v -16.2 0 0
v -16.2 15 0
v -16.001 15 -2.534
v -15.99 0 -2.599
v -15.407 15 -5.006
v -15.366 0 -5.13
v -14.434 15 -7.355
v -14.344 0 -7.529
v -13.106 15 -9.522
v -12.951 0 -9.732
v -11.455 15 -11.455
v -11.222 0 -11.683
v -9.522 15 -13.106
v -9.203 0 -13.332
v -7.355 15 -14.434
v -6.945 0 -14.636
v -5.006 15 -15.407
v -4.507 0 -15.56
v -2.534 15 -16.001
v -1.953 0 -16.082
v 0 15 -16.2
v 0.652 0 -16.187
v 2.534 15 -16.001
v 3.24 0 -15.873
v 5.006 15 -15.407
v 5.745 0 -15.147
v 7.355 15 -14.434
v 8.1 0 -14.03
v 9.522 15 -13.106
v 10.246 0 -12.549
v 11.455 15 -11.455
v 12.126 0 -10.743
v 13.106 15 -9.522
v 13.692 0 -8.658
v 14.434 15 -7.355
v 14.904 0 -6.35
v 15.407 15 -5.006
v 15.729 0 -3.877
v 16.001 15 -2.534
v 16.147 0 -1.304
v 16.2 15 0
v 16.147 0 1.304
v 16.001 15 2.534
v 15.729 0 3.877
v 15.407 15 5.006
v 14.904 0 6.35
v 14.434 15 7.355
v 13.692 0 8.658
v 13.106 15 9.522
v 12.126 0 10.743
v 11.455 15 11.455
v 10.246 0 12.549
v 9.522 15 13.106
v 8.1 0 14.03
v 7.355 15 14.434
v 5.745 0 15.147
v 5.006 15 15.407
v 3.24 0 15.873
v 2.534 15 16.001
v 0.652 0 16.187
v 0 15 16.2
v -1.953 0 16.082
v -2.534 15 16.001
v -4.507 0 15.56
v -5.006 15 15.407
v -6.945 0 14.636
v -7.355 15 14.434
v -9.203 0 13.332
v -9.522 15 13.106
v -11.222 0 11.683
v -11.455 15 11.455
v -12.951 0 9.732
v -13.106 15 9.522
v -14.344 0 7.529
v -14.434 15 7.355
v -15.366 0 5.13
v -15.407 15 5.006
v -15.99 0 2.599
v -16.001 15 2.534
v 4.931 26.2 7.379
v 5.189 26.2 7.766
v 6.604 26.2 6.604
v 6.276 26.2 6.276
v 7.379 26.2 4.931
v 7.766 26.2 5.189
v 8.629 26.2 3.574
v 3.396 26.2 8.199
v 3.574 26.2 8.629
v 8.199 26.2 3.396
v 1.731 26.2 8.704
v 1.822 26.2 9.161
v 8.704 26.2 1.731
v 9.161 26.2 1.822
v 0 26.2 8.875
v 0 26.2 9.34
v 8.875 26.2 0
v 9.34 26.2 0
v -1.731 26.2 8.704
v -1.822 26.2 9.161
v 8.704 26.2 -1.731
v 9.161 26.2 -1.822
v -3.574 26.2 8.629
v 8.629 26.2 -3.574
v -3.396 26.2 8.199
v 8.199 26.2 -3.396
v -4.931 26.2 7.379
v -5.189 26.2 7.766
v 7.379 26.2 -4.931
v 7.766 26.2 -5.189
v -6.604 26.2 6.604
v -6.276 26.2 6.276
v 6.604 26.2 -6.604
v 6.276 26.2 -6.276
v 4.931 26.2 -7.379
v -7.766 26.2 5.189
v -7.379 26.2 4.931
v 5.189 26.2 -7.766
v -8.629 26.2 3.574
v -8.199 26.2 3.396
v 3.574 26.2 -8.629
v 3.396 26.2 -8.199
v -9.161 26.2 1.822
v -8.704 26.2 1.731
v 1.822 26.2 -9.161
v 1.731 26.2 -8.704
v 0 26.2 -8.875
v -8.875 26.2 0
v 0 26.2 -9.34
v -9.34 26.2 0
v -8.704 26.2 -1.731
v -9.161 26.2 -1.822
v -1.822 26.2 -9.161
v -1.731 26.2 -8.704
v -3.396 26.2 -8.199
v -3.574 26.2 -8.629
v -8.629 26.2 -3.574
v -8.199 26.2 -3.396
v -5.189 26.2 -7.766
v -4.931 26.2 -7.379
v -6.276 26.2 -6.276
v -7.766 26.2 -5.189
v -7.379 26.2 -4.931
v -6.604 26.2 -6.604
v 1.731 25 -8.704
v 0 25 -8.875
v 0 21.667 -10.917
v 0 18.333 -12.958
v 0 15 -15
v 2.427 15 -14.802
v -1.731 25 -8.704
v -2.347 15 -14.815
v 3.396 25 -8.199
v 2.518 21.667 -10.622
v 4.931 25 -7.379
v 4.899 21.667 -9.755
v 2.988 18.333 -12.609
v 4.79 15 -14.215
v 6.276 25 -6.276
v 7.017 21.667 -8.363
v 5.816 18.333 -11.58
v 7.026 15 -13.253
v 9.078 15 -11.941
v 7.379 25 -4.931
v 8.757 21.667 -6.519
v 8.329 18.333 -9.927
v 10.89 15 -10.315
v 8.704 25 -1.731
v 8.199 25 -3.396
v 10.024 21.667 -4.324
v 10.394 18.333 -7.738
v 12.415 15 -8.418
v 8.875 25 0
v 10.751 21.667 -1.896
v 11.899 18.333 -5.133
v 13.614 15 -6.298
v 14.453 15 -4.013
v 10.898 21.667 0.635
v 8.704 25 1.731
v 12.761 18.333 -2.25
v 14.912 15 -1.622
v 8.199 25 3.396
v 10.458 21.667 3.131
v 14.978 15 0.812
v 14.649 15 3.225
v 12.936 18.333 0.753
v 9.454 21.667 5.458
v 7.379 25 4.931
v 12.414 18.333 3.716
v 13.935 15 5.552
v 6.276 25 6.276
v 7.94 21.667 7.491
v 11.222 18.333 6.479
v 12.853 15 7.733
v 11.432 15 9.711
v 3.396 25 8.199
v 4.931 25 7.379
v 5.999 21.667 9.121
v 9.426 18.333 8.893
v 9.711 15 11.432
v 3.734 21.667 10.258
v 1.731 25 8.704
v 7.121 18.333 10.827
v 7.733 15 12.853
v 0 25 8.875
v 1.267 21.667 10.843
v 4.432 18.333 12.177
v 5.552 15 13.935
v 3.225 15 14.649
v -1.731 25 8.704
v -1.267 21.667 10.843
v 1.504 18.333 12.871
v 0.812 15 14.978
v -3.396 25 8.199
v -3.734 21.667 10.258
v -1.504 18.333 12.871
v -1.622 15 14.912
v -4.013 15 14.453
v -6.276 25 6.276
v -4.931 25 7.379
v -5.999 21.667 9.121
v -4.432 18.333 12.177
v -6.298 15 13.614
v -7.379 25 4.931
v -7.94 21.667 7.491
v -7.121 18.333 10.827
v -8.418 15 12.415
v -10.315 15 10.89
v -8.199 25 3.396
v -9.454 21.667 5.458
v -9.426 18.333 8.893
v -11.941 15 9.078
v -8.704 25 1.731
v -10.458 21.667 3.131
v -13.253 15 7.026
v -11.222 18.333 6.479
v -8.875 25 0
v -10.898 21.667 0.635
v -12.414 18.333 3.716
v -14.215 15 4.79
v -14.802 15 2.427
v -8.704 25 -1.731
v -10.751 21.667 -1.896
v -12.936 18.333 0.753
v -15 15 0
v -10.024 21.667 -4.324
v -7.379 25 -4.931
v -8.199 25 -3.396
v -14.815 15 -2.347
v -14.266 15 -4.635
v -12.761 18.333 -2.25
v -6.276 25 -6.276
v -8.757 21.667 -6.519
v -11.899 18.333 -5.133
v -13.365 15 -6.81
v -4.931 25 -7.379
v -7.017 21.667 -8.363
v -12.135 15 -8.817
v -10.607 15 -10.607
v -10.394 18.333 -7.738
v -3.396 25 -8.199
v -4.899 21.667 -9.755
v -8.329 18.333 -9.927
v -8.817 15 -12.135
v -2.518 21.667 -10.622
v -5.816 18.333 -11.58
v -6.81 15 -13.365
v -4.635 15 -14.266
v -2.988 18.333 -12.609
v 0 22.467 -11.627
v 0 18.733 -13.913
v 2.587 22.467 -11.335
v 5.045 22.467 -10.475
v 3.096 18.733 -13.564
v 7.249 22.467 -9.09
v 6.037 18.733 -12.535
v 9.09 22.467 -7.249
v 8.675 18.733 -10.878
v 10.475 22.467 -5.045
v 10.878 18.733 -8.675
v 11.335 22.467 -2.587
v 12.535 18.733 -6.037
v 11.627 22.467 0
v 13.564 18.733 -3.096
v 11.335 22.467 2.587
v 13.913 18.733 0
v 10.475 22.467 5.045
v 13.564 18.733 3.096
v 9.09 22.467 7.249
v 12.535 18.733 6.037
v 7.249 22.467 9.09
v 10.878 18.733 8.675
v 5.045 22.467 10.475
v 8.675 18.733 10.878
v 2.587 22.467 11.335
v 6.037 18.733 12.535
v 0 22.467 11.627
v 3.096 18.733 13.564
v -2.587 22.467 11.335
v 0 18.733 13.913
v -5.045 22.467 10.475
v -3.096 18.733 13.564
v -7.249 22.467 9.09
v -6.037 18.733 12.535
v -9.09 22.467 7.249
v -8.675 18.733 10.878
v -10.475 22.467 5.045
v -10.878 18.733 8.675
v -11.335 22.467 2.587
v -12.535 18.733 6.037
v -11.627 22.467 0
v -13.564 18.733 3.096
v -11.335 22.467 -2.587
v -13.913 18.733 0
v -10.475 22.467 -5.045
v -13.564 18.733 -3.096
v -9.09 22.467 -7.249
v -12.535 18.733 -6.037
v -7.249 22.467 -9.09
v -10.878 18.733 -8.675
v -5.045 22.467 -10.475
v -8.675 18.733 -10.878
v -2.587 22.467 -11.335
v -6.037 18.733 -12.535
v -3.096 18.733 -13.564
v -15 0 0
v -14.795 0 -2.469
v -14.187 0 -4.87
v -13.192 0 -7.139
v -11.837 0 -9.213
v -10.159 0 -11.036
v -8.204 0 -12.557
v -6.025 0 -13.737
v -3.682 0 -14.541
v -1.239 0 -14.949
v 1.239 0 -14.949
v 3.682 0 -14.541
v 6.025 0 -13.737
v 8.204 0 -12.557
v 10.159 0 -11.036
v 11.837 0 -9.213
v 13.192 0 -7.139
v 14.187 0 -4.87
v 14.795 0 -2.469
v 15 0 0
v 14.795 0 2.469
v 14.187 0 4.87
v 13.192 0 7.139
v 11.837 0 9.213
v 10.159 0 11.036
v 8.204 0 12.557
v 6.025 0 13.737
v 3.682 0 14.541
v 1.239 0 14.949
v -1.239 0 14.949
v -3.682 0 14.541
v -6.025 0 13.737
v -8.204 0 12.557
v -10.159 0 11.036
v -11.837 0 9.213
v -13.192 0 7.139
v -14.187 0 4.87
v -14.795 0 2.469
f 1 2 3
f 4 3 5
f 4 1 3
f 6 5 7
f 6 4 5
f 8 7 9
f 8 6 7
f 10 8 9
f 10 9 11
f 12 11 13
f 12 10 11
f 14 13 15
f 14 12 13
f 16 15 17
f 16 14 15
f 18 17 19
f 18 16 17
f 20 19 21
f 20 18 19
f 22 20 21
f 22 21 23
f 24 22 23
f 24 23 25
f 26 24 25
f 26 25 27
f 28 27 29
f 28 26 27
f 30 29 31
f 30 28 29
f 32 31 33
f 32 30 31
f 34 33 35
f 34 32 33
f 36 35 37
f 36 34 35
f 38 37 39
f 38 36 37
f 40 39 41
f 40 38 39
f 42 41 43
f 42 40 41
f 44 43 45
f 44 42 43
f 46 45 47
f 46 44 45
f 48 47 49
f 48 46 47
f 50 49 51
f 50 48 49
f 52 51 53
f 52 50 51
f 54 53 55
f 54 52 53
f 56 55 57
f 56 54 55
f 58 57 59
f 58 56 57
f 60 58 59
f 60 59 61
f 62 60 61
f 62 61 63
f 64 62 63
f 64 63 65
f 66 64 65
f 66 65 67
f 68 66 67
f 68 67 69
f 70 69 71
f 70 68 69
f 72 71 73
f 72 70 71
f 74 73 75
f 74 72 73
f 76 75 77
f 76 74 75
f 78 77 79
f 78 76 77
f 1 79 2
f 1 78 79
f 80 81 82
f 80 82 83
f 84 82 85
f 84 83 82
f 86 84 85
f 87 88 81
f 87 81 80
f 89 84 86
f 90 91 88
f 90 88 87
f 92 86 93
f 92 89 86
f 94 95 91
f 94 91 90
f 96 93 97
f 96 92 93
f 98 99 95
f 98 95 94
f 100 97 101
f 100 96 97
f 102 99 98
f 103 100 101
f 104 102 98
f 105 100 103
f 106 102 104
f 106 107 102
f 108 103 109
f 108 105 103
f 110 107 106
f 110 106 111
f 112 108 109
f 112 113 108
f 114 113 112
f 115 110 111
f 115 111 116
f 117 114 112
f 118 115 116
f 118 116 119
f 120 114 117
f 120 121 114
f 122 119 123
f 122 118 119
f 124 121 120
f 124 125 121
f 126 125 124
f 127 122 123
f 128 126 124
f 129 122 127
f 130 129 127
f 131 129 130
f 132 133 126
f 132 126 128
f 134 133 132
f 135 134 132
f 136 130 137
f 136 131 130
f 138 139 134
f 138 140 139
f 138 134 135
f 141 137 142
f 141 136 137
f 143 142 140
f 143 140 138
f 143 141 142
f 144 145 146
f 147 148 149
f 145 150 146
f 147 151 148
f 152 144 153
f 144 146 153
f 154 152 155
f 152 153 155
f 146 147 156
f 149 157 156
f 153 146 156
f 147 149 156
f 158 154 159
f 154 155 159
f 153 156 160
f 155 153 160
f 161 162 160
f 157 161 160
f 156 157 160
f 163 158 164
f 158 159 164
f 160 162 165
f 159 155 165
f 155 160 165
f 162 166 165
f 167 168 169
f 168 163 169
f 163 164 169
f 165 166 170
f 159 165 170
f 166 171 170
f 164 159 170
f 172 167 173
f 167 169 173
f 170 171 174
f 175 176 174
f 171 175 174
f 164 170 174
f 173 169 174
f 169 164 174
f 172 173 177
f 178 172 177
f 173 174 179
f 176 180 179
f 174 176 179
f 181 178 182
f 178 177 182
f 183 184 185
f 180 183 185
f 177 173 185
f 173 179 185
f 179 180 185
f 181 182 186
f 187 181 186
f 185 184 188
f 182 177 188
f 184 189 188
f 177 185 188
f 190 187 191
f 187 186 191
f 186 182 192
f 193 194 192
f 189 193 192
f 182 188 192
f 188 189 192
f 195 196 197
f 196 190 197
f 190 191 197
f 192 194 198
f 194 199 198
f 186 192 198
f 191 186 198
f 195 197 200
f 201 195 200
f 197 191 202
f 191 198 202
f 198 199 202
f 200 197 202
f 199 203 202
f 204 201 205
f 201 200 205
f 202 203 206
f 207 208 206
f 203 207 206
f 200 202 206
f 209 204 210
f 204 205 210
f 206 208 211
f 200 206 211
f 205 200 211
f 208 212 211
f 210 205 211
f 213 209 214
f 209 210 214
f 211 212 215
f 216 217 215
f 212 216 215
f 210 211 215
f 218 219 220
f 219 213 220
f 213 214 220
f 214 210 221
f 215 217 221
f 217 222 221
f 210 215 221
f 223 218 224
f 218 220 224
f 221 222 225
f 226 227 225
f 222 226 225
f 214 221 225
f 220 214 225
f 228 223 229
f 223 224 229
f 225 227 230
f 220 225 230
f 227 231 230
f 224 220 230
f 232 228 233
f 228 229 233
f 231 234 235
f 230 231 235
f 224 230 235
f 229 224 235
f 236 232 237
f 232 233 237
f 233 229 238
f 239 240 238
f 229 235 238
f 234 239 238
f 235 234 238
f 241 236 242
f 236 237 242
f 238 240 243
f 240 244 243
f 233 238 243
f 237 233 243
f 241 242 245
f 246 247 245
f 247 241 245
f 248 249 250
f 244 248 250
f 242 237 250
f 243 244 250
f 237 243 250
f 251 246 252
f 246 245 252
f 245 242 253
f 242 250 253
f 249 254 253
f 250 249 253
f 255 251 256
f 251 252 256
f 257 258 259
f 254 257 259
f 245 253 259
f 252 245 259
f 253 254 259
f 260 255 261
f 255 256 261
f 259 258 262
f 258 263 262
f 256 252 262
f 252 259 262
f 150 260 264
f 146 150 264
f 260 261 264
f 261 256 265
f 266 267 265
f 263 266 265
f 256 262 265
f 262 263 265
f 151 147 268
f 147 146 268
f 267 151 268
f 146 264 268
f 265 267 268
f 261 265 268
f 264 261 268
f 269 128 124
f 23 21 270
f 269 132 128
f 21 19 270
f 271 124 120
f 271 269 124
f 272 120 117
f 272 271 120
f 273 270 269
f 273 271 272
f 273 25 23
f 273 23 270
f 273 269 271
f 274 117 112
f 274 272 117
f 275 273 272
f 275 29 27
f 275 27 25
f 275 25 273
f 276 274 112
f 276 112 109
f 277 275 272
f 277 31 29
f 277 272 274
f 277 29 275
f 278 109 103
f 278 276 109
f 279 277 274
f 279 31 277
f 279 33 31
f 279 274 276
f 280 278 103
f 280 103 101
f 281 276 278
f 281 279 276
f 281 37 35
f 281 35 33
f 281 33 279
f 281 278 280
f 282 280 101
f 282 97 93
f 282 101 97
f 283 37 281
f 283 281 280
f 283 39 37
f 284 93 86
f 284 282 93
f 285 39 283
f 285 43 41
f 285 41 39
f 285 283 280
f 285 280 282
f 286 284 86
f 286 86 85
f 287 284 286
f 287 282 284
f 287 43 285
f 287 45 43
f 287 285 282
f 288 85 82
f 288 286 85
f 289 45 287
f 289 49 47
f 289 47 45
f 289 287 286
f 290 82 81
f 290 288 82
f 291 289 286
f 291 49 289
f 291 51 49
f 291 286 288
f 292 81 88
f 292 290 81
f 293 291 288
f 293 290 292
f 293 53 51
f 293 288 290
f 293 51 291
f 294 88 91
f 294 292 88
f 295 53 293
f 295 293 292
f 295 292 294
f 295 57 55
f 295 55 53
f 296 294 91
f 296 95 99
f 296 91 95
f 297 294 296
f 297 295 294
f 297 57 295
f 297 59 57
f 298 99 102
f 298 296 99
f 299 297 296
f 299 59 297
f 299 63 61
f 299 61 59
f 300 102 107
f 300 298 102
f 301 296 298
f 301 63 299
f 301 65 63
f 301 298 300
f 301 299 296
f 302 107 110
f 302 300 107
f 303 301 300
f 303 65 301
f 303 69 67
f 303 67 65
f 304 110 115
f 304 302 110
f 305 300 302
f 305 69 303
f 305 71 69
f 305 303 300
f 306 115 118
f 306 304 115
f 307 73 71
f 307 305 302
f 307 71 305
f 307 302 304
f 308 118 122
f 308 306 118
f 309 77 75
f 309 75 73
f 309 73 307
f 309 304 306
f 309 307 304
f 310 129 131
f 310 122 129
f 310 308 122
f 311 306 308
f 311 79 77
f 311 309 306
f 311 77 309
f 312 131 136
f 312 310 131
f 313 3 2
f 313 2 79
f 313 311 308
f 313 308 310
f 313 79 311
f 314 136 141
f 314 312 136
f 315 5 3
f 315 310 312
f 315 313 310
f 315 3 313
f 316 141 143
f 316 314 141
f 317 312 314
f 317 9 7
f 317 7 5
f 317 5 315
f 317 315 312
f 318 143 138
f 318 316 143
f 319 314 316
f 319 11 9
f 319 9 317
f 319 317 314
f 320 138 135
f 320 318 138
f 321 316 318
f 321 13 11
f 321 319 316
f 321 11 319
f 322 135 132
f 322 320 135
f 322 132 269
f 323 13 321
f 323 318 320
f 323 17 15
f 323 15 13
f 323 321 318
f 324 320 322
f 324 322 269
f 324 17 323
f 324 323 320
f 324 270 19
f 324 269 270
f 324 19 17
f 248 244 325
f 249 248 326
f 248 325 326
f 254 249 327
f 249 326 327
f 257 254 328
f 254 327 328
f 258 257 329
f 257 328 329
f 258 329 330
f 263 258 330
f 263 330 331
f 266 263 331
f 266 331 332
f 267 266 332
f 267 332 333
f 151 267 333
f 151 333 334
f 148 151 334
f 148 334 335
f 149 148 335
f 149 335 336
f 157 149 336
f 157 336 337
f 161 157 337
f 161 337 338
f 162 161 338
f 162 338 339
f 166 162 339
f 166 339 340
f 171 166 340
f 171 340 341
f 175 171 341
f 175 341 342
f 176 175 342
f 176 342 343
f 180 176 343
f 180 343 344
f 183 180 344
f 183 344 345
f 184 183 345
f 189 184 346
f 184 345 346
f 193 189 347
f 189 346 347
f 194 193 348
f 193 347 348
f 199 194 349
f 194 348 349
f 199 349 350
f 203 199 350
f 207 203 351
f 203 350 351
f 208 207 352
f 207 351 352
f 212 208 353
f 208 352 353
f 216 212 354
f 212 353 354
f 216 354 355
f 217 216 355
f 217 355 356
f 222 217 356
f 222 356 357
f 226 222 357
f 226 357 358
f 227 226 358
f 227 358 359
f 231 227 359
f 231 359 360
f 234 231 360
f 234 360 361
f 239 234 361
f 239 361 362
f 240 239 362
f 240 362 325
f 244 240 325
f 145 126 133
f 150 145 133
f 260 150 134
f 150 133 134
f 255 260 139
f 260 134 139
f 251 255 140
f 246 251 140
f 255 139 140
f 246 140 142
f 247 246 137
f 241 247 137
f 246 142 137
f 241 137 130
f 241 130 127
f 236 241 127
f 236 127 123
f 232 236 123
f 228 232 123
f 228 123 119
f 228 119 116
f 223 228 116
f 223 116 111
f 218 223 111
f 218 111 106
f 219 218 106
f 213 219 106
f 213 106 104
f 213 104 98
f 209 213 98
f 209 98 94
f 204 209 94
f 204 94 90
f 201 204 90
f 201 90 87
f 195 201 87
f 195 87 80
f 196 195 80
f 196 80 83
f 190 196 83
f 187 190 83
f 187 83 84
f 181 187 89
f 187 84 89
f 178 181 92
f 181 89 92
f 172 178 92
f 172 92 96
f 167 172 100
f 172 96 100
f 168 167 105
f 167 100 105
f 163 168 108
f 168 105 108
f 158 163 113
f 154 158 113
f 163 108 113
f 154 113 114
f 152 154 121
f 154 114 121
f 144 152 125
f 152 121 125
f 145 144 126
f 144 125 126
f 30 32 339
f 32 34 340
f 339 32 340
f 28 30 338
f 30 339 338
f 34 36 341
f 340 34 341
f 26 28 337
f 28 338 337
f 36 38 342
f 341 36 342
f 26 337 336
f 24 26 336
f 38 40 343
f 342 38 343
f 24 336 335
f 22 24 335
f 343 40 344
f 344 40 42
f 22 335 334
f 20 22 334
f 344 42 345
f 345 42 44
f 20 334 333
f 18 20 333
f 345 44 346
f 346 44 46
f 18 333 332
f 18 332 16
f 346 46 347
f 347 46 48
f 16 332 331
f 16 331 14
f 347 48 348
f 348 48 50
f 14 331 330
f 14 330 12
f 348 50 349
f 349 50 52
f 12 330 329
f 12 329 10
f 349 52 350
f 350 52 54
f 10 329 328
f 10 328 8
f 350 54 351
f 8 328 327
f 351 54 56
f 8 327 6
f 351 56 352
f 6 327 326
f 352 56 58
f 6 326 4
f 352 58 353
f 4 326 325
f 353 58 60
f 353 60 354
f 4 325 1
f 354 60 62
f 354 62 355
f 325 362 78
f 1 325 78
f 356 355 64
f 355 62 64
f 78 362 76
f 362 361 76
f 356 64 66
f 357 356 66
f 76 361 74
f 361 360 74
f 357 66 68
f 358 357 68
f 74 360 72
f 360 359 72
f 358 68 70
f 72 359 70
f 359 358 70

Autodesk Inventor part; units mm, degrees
ref_plane "YZ Plane" through (0, 0, 0) normal (1, 0, 0) x (0, 1, 0)
ref_plane "XZ Plane" through (0, 0, 0) normal (0, 1, 0) x (-1, 0, 0)
ref_plane "XY Plane" through (0, 0, 0) normal (0, 0, 1) x (1, 0, 0)
sketch "Sketch1" plane through (0, 0, 0) normal (0, 1, 0) x (-1, 0, 0)
  circle A0 centre (0, 0) radius 16.2
  circle A1 centre (0, 0) radius 15
  dimension "d0" = 32.4
  dimension "d1" = 30
extrude "Extrusion1" add sketch "Sketch1" along normal blind 15
sketch "Sketch2" plane through (0, 0, 0) normal (1, 0, 0) x (0, 1, 0)
  line L0 (25, 0) -> (25, -8.875) construction
  line L1 (15, -16.2) -> (15, 16.2) projected
  line L2 (15, -16.2) -> (15, -15)
  line L3 (25, -8.875) -> (15, -15)
  line L4 (26.2, -8.875) -> (26.2, -9.34)
  line L5 (15, -16.2) -> (26.2, -9.34)
  line L6 (25, -8.875) -> (26.2, -8.875)
  line L7 (15, 0) -> (31.8321, 0)
  point P0 (0, 0)
  dimension "d7" = 1.2
revolve "Revolution1" add sketch "Sketch2" angle 360 about axis through (0, 15, 0) along (0, 1, 0)
properties part number "Top Nozzle Connector"
